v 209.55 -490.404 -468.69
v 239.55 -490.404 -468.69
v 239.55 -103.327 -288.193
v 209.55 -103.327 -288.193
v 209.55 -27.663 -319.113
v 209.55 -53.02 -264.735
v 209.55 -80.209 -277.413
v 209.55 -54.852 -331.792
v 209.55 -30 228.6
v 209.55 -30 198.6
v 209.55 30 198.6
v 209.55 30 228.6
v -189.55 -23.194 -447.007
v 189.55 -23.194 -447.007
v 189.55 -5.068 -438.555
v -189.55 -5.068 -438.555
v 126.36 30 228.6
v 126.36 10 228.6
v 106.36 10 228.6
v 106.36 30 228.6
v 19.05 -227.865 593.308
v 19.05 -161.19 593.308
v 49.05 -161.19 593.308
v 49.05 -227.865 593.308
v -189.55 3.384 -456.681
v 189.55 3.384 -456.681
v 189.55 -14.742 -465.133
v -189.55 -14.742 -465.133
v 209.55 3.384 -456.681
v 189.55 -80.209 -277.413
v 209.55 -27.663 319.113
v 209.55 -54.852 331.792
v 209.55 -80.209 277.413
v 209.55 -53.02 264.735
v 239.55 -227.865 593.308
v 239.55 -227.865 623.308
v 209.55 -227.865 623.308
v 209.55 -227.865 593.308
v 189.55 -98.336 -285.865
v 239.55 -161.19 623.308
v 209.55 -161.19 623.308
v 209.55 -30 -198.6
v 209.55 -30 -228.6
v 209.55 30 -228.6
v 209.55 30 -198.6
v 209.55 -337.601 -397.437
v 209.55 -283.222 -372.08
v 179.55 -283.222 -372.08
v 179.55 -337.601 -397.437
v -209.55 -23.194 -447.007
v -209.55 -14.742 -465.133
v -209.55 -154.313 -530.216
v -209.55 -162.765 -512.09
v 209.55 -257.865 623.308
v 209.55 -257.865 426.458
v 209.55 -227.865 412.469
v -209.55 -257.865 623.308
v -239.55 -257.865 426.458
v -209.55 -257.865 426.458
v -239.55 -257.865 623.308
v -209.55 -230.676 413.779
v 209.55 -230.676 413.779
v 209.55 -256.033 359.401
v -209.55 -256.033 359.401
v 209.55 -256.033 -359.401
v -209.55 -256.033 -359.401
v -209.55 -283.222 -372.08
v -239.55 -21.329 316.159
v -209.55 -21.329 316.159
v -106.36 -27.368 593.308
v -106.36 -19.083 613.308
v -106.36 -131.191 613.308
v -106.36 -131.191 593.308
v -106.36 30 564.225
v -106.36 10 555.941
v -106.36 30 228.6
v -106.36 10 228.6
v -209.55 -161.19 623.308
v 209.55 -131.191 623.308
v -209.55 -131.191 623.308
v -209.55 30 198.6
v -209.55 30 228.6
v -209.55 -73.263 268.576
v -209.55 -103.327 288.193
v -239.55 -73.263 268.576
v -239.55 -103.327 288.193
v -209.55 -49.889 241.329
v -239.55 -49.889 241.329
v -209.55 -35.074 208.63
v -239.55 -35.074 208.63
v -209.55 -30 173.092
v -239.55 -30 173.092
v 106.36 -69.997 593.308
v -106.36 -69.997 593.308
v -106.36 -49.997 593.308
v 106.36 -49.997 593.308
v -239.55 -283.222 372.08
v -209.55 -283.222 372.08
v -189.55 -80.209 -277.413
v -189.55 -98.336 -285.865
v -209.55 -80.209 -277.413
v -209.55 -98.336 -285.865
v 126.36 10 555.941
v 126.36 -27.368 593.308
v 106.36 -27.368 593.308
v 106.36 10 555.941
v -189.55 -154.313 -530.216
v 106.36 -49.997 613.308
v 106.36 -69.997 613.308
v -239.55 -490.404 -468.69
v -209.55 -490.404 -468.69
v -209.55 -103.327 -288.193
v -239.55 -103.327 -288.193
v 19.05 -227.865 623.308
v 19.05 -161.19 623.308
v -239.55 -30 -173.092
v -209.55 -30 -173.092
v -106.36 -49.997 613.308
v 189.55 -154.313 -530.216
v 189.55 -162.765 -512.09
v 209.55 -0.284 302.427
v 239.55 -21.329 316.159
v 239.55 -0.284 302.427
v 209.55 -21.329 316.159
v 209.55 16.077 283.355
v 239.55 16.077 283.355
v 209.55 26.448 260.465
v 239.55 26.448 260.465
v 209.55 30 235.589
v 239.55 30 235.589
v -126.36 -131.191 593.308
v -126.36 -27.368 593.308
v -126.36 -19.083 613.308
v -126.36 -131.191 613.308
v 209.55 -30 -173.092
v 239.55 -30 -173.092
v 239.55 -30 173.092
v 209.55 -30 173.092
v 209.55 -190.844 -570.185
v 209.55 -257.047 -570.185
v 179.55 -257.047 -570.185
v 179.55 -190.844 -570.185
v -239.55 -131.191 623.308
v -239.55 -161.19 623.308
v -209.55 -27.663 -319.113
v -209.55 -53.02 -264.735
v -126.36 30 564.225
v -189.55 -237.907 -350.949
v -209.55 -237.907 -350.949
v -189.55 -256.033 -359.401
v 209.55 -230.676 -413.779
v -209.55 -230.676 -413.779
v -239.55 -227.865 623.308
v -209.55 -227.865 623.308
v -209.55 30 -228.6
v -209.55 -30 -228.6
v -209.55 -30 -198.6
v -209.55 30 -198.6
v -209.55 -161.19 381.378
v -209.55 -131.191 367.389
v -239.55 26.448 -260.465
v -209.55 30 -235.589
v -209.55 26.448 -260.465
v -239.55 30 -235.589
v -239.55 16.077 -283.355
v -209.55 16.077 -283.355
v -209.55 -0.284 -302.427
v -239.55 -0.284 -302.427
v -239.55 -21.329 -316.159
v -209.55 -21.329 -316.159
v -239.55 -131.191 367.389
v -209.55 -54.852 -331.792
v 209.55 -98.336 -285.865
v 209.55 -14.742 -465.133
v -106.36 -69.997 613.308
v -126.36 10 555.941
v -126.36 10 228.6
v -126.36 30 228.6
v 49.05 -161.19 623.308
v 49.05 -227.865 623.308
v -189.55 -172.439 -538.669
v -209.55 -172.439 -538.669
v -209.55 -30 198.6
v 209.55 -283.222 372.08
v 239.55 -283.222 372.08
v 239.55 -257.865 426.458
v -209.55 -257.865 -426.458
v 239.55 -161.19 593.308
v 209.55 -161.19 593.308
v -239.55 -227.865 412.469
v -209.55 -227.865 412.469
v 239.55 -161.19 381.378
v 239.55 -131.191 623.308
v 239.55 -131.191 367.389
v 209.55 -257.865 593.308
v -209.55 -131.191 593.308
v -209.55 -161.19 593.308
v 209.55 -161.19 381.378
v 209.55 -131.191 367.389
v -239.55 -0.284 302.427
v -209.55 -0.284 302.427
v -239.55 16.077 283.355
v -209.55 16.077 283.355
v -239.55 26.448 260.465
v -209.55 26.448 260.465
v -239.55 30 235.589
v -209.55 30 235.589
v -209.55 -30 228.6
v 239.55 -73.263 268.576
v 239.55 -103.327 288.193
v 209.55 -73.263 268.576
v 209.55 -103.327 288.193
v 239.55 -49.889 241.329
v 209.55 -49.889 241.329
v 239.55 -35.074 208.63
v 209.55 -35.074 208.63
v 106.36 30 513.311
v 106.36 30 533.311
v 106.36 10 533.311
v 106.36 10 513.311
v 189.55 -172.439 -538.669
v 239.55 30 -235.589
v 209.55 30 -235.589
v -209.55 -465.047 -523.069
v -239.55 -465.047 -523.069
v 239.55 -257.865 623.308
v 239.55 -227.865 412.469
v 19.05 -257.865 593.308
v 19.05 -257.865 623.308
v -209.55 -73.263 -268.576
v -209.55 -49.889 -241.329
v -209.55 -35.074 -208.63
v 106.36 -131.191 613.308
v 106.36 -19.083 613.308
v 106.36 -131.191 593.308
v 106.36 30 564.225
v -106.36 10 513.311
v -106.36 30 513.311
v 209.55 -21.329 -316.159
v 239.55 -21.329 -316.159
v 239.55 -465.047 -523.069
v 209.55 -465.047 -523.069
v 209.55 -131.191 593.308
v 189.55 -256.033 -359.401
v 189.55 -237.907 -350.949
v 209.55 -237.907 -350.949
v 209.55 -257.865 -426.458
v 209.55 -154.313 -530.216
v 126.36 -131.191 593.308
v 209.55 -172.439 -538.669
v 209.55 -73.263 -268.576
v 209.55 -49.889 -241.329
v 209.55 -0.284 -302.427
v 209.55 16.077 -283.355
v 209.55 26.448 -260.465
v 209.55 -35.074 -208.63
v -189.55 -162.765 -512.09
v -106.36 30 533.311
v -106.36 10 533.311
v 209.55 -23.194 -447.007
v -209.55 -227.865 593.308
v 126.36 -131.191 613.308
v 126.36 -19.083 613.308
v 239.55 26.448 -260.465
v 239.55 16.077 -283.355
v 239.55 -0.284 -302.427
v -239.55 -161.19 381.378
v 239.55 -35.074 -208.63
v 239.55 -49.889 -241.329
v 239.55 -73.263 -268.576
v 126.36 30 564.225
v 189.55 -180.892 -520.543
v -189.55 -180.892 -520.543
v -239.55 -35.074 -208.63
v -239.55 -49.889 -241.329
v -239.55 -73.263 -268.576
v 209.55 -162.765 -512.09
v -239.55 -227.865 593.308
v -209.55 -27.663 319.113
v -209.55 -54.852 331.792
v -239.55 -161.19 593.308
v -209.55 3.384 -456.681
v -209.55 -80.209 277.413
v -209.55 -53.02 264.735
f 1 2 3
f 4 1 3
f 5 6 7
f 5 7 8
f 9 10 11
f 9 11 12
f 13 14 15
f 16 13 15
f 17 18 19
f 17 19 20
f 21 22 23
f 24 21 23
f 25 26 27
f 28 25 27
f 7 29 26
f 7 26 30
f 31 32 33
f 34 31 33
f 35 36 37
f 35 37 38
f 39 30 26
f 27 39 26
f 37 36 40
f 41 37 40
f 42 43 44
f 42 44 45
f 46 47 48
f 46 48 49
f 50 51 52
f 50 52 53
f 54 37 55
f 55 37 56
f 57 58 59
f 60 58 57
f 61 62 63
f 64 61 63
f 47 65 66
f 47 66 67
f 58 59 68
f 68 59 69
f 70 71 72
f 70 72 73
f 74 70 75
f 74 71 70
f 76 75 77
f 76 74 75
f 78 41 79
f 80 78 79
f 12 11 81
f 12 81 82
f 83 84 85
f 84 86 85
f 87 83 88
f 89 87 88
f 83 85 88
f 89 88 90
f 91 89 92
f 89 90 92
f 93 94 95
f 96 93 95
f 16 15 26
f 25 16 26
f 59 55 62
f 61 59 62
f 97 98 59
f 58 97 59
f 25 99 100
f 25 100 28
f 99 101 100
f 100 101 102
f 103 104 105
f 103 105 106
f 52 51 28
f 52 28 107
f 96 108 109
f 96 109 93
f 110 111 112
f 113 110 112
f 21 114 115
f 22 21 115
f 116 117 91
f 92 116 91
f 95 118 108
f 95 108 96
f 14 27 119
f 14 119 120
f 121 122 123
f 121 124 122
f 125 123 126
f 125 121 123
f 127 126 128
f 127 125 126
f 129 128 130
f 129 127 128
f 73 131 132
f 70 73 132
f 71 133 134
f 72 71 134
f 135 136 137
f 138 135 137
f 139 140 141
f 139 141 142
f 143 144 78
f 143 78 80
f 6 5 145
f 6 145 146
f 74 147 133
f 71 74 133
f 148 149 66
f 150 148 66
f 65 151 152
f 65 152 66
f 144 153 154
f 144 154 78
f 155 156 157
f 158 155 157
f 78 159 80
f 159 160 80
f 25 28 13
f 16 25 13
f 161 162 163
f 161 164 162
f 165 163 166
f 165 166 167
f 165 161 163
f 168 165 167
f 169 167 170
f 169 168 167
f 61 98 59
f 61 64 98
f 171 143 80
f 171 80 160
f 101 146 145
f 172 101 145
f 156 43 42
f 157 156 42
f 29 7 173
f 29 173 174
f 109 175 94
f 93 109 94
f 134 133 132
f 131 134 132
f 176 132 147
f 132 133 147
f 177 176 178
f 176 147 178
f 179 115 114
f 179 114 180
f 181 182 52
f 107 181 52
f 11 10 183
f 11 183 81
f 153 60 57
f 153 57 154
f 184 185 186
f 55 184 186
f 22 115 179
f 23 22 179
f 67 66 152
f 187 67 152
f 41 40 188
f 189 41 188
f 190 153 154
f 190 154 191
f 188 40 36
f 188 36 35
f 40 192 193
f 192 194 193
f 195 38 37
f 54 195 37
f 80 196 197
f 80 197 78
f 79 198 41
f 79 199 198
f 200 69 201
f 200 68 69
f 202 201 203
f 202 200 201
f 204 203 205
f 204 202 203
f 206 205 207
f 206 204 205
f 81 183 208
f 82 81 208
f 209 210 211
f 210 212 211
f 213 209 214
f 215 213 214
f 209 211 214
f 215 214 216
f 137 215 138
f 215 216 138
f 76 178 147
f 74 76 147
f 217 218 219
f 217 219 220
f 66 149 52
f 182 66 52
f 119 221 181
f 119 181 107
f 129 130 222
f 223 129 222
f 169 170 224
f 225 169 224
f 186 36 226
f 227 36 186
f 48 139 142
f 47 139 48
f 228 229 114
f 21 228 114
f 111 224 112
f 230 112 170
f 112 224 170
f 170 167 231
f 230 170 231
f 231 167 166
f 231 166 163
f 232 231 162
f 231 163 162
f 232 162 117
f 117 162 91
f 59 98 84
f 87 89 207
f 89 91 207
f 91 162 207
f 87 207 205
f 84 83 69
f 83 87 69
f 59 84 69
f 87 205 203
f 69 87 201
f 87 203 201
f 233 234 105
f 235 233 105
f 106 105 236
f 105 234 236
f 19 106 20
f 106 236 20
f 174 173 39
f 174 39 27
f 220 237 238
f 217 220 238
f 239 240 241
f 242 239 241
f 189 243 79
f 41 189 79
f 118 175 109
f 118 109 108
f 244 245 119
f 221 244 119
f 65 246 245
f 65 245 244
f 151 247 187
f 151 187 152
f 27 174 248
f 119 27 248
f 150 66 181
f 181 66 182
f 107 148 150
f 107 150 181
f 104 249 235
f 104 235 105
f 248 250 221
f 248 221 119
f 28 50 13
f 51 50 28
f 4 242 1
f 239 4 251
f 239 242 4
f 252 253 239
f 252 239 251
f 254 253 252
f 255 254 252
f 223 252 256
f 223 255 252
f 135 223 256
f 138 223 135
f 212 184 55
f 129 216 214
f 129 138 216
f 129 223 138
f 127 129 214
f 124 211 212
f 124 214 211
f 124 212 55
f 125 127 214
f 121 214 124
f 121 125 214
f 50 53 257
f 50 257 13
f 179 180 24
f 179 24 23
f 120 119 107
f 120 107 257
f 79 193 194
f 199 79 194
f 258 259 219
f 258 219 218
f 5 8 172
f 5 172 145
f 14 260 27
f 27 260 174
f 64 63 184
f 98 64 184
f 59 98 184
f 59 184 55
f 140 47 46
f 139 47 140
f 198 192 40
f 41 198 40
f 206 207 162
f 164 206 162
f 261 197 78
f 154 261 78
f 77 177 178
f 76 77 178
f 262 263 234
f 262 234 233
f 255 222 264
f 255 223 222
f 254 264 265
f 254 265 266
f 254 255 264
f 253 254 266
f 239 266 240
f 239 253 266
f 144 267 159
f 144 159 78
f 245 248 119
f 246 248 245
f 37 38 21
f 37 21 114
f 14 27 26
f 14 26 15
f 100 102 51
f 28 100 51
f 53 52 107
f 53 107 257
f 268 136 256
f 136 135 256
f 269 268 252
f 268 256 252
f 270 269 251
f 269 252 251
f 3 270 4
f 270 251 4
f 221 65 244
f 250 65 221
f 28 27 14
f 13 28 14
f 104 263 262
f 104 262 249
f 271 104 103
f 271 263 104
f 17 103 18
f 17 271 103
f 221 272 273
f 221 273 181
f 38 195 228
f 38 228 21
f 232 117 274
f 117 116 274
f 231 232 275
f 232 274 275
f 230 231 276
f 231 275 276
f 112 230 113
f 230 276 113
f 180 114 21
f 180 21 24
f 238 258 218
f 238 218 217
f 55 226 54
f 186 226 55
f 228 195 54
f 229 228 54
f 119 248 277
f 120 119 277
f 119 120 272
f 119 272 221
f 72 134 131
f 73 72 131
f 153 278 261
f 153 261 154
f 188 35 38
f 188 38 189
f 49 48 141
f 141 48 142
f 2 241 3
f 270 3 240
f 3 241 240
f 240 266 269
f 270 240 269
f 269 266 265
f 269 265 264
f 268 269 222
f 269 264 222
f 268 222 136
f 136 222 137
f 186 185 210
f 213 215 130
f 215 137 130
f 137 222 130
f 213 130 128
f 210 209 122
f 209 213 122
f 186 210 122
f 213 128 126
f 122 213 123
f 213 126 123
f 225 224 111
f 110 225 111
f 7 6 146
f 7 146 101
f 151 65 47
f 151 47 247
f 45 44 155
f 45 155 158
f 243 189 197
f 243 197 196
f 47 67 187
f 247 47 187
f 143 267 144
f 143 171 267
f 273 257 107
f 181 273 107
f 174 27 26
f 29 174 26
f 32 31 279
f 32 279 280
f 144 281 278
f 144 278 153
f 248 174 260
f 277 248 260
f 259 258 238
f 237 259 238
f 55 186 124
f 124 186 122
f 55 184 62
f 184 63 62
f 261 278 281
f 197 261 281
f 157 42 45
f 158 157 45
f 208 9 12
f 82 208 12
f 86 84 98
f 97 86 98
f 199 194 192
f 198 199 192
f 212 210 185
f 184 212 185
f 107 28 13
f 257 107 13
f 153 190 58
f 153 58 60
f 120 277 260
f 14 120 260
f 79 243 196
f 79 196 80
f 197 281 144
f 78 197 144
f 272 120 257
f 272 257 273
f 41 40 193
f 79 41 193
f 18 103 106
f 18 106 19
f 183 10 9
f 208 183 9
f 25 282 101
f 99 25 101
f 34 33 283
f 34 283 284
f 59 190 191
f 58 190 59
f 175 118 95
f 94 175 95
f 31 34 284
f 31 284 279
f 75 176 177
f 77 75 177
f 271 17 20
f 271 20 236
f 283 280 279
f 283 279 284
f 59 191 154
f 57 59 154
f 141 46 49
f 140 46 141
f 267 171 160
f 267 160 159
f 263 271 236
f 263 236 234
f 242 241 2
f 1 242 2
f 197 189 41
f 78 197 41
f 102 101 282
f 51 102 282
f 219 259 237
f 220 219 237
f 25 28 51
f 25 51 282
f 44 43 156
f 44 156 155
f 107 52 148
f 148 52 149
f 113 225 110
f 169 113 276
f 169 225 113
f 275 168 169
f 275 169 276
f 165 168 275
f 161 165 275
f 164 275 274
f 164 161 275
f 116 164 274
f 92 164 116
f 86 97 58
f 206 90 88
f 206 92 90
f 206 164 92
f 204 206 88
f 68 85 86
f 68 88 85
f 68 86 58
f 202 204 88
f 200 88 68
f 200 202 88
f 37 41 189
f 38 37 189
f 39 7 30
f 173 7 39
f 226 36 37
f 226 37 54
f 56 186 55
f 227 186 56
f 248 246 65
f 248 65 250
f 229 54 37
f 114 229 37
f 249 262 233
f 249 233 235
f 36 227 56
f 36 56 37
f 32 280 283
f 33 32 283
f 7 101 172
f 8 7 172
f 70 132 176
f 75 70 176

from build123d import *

# Parameters (mm, degrees)
BOSS_EXTRUDE1_START   = 239.55
BOSS_EXTRUDE1_DEPTH   = 30
BOSS_EXTRUDE2_DEPTH   = 30
BOSS_EXTRUDE2_2_DEPTH = 30
SKETCH12_W            = 29.999880001
SKETCH12_H            = 66.675
BOSS_EXTRUDE11_DEPTH  = 30
SKETCH3_W             = 30
SKETCH3_H             = 60
BOSS_EXTRUDE3_DEPTH   = 419.1
BOSS_EXTRUDE3_2_DEPTH = 419.1
BOSS_EXTRUDE3_3_DEPTH = 419.1
SKETCH3_W_2           = 29.999880001
SKETCH3_H_2           = 29.99988
BOSS_EXTRUDE3_4_DEPTH = 419.1
SKETCH3_H_3           = 29.999880001
BOSS_EXTRUDE3_5_DEPTH = 419.1
BOSS_EXTRUDE3_6_DEPTH = 419.1
BOSS_EXTRUDE3_7_DEPTH = 419.1
BOSS_EXTRUDE3_8_DEPTH = 419.1
BOSS_EXTRUDE4_DEPTH   = 30
BOSS_EXTRUDE5_DEPTH   = 30
BOSS_EXTRUDE5_2_DEPTH = 30
SKETCH13_W            = 29.999880001
SKETCH13_H            = 66.675
BOSS_EXTRUDE12_DEPTH  = 30
BOSS_EXTRUDE6_DEPTH   = 20
BOSS_EXTRUDE6_2_DEPTH = 20
BOSS_EXTRUDE13_DEPTH  = 20
BOSS_EXTRUDE7_DEPTH   = 379.1
BOSS_EXTRUDE7_2_DEPTH = 379.1
BOSS_EXTRUDE8_DEPTH   = 20
SKETCH9_W             = 20
SKETCH9_H             = 20
BOSS_EXTRUDE9_DEPTH   = 212.72
BOSS_EXTRUDE9_2_DEPTH = 212.72
SKETCH10_W            = 30
SKETCH10_H            = 66.675
BOSS_EXTRUDE10_DEPTH  = 30
SKETCH11_W            = 228.60006
SKETCH11_H            = 29.999880001
CUT_EXTRUDE1_DEPTH    = 29.99988
BOSS_EXTRUDE14_DEPTH  = 30
FILLET1_R             = 88.9
FILLET2_R             = 88.9
FILLET3_R             = 127
FILLET4_R             = 127


with BuildPart() as part:
    # Sketch1 → Boss-Extrude1 (new body)
    with BuildSketch(Plane(origin=(0, 0, 0), x_dir=(0, 0, -1), z_dir=(1, 0, 0)).offset(BOSS_EXTRUDE1_START)):
        Polygon((254, -30), (-254, -30), (-372.07954233, -283.222395698), (-426.458009553, -257.865299994), (-292.224215648, 30), (292.224215648, 30), (523.068544186, -465.04726011), (468.690076964, -490.404355815), align=None)
    extrude(amount=-BOSS_EXTRUDE1_DEPTH)

    # Fillet1
    fillet1_edges = [part.edges().sort_by_distance(p)[0] for p in [
        (224.55, 30, 292.224215648),
        (224.55, 30, -292.224215648),
    ]]
    fillet(fillet1_edges, radius=FILLET1_R)

    # Fillet3
    fillet3_edges = [part.edges().sort_by_distance(p)[0] for p in [
        (224.55, -30, -254),
        (224.55, -30, 254),
    ]]
    fillet(fillet3_edges, radius=FILLET3_R)


with BuildPart() as body_2:
    # Sketch2 → Boss-Extrude2 (new body)
    with BuildSketch(Plane(origin=(239.55, 0, 0), x_dir=(0, 0, -1), z_dir=(1, 0, 0))):
        Polygon((-381.377772657, -161.190419993), (-623.308009553, -161.190419993), (-623.308009553, -131.190539993), (-367.388598869, -131.190539993), align=None)
    extrude(amount=-BOSS_EXTRUDE2_DEPTH)


with BuildPart() as body_3:
    # Sketch2 → Boss-Extrude2 2 (new body)
    with BuildSketch(Plane(origin=(239.55, 0, 0), x_dir=(0, 0, -1), z_dir=(1, 0, 0))):
        Polygon((-412.468835765, -227.865419993), (-623.308009553, -227.865419993), (-623.308009553, -257.865299994), (-426.458009553, -257.865299994), align=None)
    extrude(amount=-BOSS_EXTRUDE2_2_DEPTH)


with BuildPart() as body_4:
    # Sketch12 → Boss-Extrude11 (new body)
    with BuildSketch(Plane(origin=(239.55, 0, 0), x_dir=(0, 0, -1), z_dir=(1, 0, 0))):
        with Locations((-608.308069553, -194.527919993)):
            Rectangle(SKETCH12_W, SKETCH12_H)
    extrude(amount=-BOSS_EXTRUDE11_DEPTH)


with BuildPart() as body_5:
    # Sketch3 → Boss-Extrude3 (new body)
    with BuildSketch(Plane.ZY.offset(-209.55)):
        with Locations((213.6, 0)):
            Rectangle(SKETCH3_W, SKETCH3_H)
    extrude(amount=BOSS_EXTRUDE3_DEPTH)


with BuildPart() as body_6:
    # Sketch3 → Boss-Extrude3 2 (new body)
    with BuildSketch(Plane.ZY.offset(-209.55)):
        Polygon((264.734503848, -53.020217791), (319.11297107, -27.663122086), (331.791518923, -54.852355697), (277.4130517, -80.209451402), align=None)
    extrude(amount=BOSS_EXTRUDE3_2_DEPTH)


with BuildPart() as body_7:
    # Sketch3 → Boss-Extrude3 3 (new body)
    with BuildSketch(Plane.ZY.offset(-209.55)):
        Polygon((372.07954233, -283.222395698), (426.458009553, -257.865299994), (413.7794617, -230.676066382), (359.400994478, -256.033162087), align=None)
    extrude(amount=BOSS_EXTRUDE3_3_DEPTH)


with BuildPart() as body_8:
    # Sketch3 → Boss-Extrude3 4 (new body)
    with BuildSketch(Plane.ZY.offset(-209.55)):
        with Locations((608.308069553, -146.190479993)):
            Rectangle(SKETCH3_W_2, SKETCH3_H_2)
    extrude(amount=BOSS_EXTRUDE3_4_DEPTH)


with BuildPart() as body_9:
    # Sketch3 → Boss-Extrude3 5 (new body)
    with BuildSketch(Plane.ZY.offset(-209.55)):
        with Locations((608.308069553, -242.865359994)):
            Rectangle(SKETCH3_W_2, SKETCH3_H_3)
    extrude(amount=BOSS_EXTRUDE3_5_DEPTH)

    # Sketch11 → Cut-Extrude1 (cut)
    with BuildSketch(Plane.XY.offset(623.308009553)):
        with Locations((-95.24997, -242.865359994)):
            Rectangle(SKETCH11_W, SKETCH11_H)
    extrude(amount=-CUT_EXTRUDE1_DEPTH, mode=Mode.SUBTRACT)


with BuildPart() as body_10:
    # Sketch3 → Boss-Extrude3 6 (new body)
    with BuildSketch(Plane.ZY.offset(-209.55)):
        Polygon((-359.400994478, -256.033162087), (-372.07954233, -283.222395698), (-426.458009553, -257.865299994), (-413.7794617, -230.676066382), align=None)
    extrude(amount=BOSS_EXTRUDE3_6_DEPTH)


with BuildPart() as body_11:
    # Sketch3 → Boss-Extrude3 7 (new body)
    with BuildSketch(Plane.ZY.offset(-209.55)):
        with Locations((-213.6, 0)):
            Rectangle(SKETCH3_W, SKETCH3_H)
    extrude(amount=BOSS_EXTRUDE3_7_DEPTH)


with BuildPart() as body_12:
    # Sketch3 → Boss-Extrude3 8 (new body)
    with BuildSketch(Plane.ZY.offset(-209.55)):
        Polygon((-331.791518923, -54.852355697), (-319.11297107, -27.663122086), (-264.734503848, -53.020217791), (-277.4130517, -80.209451402), align=None)
    extrude(amount=BOSS_EXTRUDE3_8_DEPTH)


with BuildPart() as body_13:
    # Sketch4 → Boss-Extrude4 (new body)
    with BuildSketch(Plane.ZY.offset(209.55)):
        Polygon((372.07954233, -283.222395698), (426.458009553, -257.865299994), (292.224215648, 30), (-292.224215648, 30), (-523.068544186, -465.04726011), (-468.690076964, -490.404355815), (-254, -30), (254, -30), align=None)
    extrude(amount=BOSS_EXTRUDE4_DEPTH)

    # Fillet2
    fillet2_edges = [body_13.edges().sort_by_distance(p)[0] for p in [
        (-224.55, 30, -292.224215648),
        (-224.55, 30, 292.224215648),
    ]]
    fillet(fillet2_edges, radius=FILLET2_R)

    # Fillet4
    fillet4_edges = [body_13.edges().sort_by_distance(p)[0] for p in [
        (-224.55, -30, 254),
        (-224.55, -30, -254),
    ]]
    fillet(fillet4_edges, radius=FILLET4_R)


with BuildPart() as body_14:
    # Sketch5 → Boss-Extrude5 (new body)
    with BuildSketch(Plane.ZY.offset(239.55)):
        Polygon((623.308009553, -227.865419993), (412.468835765, -227.865419993), (426.458009553, -257.865299994), (623.308009553, -257.865299994), align=None)
    extrude(amount=-BOSS_EXTRUDE5_DEPTH)


with BuildPart() as body_15:
    # Sketch5 → Boss-Extrude5 2 (new body)
    with BuildSketch(Plane.ZY.offset(239.55)):
        Polygon((381.377772657, -161.190419993), (623.308009553, -161.190419993), (623.308009553, -131.190539993), (367.388598869, -131.190539993), align=None)
    extrude(amount=-BOSS_EXTRUDE5_2_DEPTH)


with BuildPart() as body_16:
    # Sketch13 → Boss-Extrude12 (new body)
    with BuildSketch(Plane.ZY.offset(239.55)):
        with Locations((608.308069553, -194.527919993)):
            Rectangle(SKETCH13_W, SKETCH13_H)
    extrude(amount=-BOSS_EXTRUDE12_DEPTH)


with BuildPart() as body_17:
    # Sketch6 → Boss-Extrude6 (new body)
    with BuildSketch(Plane.ZY.offset(209.55)):
        Polygon((-456.680731976, 3.38444077), (-277.4130517, -80.209451402), (-285.865416935, -98.335607143), (-465.133097211, -14.74171497), align=None)
    extrude(amount=-BOSS_EXTRUDE6_DEPTH)


with BuildPart() as body_18:
    # Sketch6 → Boss-Extrude6 2 (new body)
    with BuildSketch(Plane.ZY.offset(209.55)):
        Polygon((-530.216309519, -154.313114174), (-350.948629243, -237.907006346), (-359.400994478, -256.033162087), (-538.668674754, -172.439269915), align=None)
    extrude(amount=-BOSS_EXTRUDE6_2_DEPTH)


with BuildPart() as body_19:
    # Sketch14 → Boss-Extrude13 (new body)
    with BuildSketch(Plane.ZY.offset(209.55)):
        Polygon((-465.133097211, -14.74171497), (-530.216309519, -154.313114174), (-512.090153778, -162.765479409), (-447.00694147, -23.194080205), align=None)
    extrude(amount=-BOSS_EXTRUDE13_DEPTH)


with BuildPart() as body_20:
    # Mirror1: mirrored copy
    add(body_18.part.mirror(Plane.ZY))


with BuildPart() as body_21:
    # Mirror1 2: mirrored copy
    add(body_17.part.mirror(Plane.ZY))


with BuildPart() as body_22:
    # Mirror1 3: mirrored copy
    add(body_19.part.mirror(Plane.ZY))


with BuildPart() as body_23:
    # Sketch7 → Boss-Extrude7 (new body)
    with BuildSketch(Plane.ZY.offset(-189.55)):
        Polygon((-447.00694147, -23.194080205), (-438.554576236, -5.067924464), (-456.680731976, 3.38444077), (-465.133097211, -14.74171497), align=None)
    extrude(amount=BOSS_EXTRUDE7_DEPTH)


with BuildPart() as body_24:
    # Sketch7 → Boss-Extrude7 2 (new body)
    with BuildSketch(Plane.ZY.offset(-189.55)):
        Polygon((-512.090153778, -162.765479409), (-520.542519013, -180.891635149), (-538.668674754, -172.439269915), (-530.216309519, -154.313114174), align=None)
    extrude(amount=BOSS_EXTRUDE7_2_DEPTH)


with BuildPart() as body_25:
    # Sketch8 → Boss-Extrude8 (new body)
    with BuildSketch(Plane.ZY.offset(126.36)):
        Polygon((613.308129552, -19.083317078), (613.308129552, -131.190539993), (593.308129552, -131.190539993), (593.308129552, -27.367588325), (555.940541227, 10), (228.6, 10), (228.6, 30), (564.224812475, 30), align=None)
    extrude(amount=-BOSS_EXTRUDE8_DEPTH)


with BuildPart() as body_26:
    # Mirror2: mirrored copy
    add(body_25.part.mirror(Plane.ZY))


with BuildPart() as body_27:
    # Sketch9 → Boss-Extrude9 (new body)
    with BuildSketch(Plane(origin=(-106.36, 0, 0), x_dir=(0, 0, -1), z_dir=(1, 0, 0))):
        with Locations((-523.310598912, 20)):
            Rectangle(SKETCH9_W, SKETCH9_H)
    extrude(amount=BOSS_EXTRUDE9_DEPTH)


with BuildPart() as body_28:
    # Sketch9 → Boss-Extrude9 2 (new body)
    with BuildSketch(Plane(origin=(-106.36, 0, 0), x_dir=(0, 0, -1), z_dir=(1, 0, 0))):
        with Locations((-603.308129552, -59.997474683)):
            Rectangle(SKETCH9_W, SKETCH9_H)
    extrude(amount=BOSS_EXTRUDE9_2_DEPTH)


with BuildPart() as body_29:
    # Sketch10 → Boss-Extrude10 (new body)
    with BuildSketch(Plane.XY.offset(623.308009553)):
        with Locations((34.05006, -194.527919993)):
            Rectangle(SKETCH10_W, SKETCH10_H)
    extrude(amount=-BOSS_EXTRUDE10_DEPTH)


with BuildPart() as body_30:
    # Sketch15 → Boss-Extrude14 (new body)
    with BuildSketch(Plane.ZY.offset(-209.55)):
        Polygon((-397.436638035, -337.60086292), (-570.184995851, -257.046980737), (-570.184995851, -190.844305599), (-372.07954233, -283.222395698), align=None)
    extrude(amount=BOSS_EXTRUDE14_DEPTH)


solid = Compound([part.part, body_2.part, body_3.part, body_4.part, body_5.part, body_6.part, body_7.part, body_8.part, body_9.part, body_10.part, body_11.part, body_12.part, body_13.part, body_14.part, body_15.part, body_16.part, body_17.part, body_18.part, body_19.part, body_20.part, body_21.part, body_22.part, body_23.part, body_24.part, body_25.part, body_26.part, body_27.part, body_28.part, body_29.part, body_30.part])
